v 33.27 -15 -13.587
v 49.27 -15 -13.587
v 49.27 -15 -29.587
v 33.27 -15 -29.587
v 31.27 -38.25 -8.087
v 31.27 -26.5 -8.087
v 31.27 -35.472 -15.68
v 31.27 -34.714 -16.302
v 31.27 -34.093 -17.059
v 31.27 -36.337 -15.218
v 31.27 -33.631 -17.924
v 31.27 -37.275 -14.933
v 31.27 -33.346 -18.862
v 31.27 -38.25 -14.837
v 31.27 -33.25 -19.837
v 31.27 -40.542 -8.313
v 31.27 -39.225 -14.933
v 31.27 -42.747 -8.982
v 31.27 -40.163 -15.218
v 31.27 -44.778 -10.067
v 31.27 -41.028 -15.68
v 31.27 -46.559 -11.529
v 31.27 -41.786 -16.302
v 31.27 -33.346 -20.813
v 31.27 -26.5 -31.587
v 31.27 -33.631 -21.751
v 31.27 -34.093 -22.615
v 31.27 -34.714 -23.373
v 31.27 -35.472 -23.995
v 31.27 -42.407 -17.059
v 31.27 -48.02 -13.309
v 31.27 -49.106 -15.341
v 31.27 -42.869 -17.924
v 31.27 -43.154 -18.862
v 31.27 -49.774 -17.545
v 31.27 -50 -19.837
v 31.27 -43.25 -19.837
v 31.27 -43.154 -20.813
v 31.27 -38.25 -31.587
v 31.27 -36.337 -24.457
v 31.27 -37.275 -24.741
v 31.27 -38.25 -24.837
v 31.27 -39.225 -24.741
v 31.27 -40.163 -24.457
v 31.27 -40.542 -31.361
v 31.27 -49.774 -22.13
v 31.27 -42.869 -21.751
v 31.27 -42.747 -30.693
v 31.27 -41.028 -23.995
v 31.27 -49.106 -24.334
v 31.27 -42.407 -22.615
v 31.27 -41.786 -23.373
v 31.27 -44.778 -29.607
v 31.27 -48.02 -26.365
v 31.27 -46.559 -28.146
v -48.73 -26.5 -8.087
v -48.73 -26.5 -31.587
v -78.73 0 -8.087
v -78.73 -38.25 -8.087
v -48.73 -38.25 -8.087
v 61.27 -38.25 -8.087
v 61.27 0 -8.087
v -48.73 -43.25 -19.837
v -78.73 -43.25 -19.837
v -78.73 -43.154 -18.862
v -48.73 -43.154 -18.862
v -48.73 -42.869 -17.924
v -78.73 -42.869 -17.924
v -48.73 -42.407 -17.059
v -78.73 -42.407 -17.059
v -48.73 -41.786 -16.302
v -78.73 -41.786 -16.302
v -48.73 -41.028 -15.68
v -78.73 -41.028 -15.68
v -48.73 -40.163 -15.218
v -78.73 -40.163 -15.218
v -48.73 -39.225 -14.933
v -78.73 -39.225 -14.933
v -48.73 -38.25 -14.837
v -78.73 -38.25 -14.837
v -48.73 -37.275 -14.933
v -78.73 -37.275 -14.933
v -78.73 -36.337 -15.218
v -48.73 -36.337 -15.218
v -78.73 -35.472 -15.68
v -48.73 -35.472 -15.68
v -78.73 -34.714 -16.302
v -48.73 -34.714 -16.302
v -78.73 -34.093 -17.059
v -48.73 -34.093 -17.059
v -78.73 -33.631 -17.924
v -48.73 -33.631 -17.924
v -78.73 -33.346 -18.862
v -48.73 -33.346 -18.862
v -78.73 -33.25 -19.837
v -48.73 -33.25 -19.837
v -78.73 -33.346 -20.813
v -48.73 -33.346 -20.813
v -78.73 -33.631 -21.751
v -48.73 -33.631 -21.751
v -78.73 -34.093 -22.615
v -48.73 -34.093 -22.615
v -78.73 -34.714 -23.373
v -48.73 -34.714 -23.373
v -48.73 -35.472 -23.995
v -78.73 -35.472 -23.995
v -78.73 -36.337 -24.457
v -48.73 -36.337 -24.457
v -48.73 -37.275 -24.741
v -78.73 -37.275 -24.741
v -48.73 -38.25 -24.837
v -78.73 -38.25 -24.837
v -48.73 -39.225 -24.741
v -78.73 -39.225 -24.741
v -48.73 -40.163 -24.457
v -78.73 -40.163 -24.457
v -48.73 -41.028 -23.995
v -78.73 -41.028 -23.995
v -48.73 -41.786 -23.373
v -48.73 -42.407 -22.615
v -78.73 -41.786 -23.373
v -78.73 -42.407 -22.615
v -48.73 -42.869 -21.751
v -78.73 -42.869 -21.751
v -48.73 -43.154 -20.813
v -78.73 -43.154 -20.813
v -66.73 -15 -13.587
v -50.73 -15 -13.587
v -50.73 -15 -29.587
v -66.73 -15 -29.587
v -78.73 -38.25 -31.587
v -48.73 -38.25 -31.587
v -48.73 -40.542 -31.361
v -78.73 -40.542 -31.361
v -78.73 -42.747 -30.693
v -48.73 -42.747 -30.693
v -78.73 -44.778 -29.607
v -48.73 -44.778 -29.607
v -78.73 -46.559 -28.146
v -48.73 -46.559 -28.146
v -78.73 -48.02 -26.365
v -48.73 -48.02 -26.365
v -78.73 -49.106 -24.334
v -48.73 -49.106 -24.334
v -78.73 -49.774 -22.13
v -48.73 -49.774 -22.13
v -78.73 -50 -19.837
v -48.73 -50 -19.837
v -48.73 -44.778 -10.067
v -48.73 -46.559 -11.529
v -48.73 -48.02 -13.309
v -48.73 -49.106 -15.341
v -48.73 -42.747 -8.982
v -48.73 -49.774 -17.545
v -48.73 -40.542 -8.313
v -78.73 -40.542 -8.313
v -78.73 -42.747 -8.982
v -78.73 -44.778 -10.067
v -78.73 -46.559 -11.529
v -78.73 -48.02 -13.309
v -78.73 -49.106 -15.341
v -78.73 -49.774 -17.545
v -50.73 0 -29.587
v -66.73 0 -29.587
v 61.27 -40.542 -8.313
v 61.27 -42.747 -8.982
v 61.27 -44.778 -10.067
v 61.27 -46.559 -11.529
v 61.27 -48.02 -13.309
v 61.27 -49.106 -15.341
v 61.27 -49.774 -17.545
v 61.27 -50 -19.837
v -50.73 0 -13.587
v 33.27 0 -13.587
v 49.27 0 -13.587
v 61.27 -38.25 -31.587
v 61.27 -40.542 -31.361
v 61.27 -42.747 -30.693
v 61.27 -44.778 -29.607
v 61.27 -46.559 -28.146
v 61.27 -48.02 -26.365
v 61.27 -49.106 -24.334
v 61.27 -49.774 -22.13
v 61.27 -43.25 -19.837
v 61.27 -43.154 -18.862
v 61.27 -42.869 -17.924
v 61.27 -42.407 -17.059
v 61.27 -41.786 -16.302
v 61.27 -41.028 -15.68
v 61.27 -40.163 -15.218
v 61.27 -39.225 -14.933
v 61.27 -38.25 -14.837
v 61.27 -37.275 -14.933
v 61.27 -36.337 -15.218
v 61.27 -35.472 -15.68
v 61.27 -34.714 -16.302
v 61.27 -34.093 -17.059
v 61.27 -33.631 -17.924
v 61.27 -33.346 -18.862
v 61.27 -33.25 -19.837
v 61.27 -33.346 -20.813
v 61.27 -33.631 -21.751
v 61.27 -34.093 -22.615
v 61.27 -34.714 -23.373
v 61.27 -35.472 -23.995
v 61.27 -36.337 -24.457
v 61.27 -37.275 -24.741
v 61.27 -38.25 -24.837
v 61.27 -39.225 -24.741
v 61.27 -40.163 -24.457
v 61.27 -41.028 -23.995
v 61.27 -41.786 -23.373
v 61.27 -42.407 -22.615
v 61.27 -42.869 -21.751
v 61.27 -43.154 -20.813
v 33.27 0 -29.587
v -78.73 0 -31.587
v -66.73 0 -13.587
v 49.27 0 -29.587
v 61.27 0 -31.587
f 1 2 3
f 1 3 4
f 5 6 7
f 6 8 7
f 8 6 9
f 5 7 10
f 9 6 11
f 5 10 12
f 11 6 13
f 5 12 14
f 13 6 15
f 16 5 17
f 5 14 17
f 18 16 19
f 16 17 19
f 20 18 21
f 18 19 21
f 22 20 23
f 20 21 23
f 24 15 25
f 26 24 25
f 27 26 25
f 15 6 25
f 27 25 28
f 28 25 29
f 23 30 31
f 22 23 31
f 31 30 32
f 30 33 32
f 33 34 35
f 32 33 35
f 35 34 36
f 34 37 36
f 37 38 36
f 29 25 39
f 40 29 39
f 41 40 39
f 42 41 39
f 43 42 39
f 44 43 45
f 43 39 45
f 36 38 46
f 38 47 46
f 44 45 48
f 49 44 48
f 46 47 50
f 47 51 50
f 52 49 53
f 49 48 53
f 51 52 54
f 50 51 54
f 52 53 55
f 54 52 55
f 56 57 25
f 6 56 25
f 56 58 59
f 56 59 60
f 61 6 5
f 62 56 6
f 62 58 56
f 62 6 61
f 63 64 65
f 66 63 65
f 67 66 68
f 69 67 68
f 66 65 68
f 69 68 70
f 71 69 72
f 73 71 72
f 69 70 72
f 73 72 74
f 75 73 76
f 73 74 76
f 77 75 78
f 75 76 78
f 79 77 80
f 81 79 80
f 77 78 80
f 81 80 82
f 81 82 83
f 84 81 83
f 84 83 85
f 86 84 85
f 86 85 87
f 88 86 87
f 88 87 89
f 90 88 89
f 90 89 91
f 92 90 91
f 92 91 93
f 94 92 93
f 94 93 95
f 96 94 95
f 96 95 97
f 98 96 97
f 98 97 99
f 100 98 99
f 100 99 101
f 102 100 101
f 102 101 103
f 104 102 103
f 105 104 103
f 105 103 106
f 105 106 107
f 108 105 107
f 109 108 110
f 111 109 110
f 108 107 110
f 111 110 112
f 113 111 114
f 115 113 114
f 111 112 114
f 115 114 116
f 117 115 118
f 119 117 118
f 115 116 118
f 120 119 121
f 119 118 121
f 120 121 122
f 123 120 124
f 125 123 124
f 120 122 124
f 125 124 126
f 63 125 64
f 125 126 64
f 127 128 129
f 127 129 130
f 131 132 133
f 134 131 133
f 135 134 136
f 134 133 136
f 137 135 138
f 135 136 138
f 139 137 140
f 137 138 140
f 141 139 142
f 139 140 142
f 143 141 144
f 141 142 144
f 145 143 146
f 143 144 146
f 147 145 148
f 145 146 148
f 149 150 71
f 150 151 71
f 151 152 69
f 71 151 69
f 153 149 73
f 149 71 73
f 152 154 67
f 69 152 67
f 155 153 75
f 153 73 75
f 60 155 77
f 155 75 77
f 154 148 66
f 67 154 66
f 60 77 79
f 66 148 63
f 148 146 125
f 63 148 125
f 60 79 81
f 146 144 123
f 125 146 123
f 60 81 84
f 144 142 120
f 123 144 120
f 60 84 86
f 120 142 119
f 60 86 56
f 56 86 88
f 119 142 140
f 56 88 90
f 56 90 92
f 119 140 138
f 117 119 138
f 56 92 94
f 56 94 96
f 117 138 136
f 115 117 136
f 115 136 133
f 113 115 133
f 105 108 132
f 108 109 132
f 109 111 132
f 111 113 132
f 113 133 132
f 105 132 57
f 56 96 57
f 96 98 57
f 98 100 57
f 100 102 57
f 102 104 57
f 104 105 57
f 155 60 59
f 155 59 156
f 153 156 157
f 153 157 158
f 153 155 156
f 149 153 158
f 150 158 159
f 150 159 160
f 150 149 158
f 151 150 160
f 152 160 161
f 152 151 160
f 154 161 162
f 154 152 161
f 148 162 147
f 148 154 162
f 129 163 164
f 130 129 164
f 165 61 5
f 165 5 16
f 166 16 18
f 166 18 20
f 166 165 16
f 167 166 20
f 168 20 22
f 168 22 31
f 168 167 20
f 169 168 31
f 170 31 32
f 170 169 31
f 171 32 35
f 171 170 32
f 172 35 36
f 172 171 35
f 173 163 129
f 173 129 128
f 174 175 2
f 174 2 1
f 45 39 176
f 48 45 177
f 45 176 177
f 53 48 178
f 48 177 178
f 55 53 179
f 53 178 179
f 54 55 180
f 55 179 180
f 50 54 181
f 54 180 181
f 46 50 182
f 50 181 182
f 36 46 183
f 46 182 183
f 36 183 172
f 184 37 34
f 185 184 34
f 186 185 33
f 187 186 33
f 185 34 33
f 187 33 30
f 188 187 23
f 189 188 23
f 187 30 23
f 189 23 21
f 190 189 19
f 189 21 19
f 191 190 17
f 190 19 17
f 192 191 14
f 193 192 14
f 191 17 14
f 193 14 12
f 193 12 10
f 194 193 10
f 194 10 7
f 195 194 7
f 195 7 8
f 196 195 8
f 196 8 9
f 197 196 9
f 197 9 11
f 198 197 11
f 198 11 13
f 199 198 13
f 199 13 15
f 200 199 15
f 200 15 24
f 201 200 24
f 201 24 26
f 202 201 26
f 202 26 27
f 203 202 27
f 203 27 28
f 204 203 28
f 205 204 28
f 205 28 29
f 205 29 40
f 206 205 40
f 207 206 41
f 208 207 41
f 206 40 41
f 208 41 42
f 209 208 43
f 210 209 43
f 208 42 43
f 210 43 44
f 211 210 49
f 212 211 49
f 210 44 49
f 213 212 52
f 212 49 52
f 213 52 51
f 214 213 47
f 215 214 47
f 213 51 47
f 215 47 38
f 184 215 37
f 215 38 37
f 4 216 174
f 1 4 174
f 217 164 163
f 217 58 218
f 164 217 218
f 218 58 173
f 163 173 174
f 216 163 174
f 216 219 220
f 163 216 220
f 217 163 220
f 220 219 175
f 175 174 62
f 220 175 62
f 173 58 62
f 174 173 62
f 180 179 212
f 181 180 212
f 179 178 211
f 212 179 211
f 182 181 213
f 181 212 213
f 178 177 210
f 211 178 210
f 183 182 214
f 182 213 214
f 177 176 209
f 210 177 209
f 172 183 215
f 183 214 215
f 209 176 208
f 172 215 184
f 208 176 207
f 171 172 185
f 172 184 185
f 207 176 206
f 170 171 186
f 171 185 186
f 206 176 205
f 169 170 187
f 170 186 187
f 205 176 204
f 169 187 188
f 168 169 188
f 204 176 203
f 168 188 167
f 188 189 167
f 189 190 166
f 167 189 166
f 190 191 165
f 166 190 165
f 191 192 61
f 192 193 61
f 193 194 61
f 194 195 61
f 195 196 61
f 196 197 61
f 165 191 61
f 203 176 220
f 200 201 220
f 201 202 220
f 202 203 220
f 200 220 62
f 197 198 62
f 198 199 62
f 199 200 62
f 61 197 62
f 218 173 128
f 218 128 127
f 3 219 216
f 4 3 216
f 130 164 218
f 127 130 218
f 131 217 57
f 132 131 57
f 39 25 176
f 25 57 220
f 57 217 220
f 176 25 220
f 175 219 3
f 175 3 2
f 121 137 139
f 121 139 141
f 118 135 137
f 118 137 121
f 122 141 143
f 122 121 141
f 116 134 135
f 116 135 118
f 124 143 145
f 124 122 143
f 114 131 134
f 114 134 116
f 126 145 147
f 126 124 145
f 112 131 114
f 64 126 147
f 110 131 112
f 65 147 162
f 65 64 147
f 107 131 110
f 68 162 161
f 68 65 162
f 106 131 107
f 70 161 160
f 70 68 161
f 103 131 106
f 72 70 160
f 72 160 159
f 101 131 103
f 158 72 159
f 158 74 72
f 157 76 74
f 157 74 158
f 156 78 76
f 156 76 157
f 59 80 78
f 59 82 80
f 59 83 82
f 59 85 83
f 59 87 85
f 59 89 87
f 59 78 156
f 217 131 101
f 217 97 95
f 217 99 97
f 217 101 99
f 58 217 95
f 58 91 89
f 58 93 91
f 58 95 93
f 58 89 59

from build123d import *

# Parameters (mm, degrees)
F0_W     = 140
F0_H     = 23.5
F1_DEPTH = 50
F2_W     = 16
F2_H     = 16
F3_DEPTH = 15
F4_R     = 11.74999
F5_R     = 5
F6_DEPTH = 140
F8_DEPTH = 25


# Not quite as in the source:
# - a fillet or chamfer is up to 0.001 mm smaller than in the source, because OpenCascade refuses the exact size


with BuildPart() as f1:
    # F0 (on Front) → F1 (new body)
    with BuildSketch(Plane.XZ):
        with Locations((-8.7296748534, -19.8372076215)):
            Rectangle(F0_W, F0_H)
    extrude(amount=F1_DEPTH)

    # F2 (on face) → F3 (cut)
    with BuildSketch(Plane(origin=(0, 0, 0), x_dir=(-1, 0, 0), z_dir=(0, 1, 0))):
        with Locations((-41.2703251466, -21.5872076215)):
            Rectangle(F2_W, F2_H)
        with Locations((58.7296748534, -21.5872076215)):
            Rectangle(F2_W, F2_H)
    extrude(amount=-F3_DEPTH, mode=Mode.SUBTRACT)

    # F4 (radius 11.75 in the source; OpenCascade refuses exactly that, so slightly less here)
    f4_edges = [f1.edges().sort_by_distance(p)[0] for p in [
        (-8.729675, -50, -8.087208),
        (-8.729675, -50, -31.587208),
    ]]
    fillet(f4_edges, radius=F4_R)

    # F5 (on face) → F6 (cut, through all)
    with BuildSketch(Plane(origin=(-78.7296748534, 0, 0), x_dir=(0, -1, 0), z_dir=(-1, 0, 0))):
        with Locations((38.25, -19.8372076215)):
            Circle(F5_R)
    extrude(amount=-F6_DEPTH, mode=Mode.SUBTRACT)

    # F7 (on face) → F8 (cut)
    with BuildSketch(Plane(origin=(0, 0, -31.5872076215), x_dir=(1, 0, 0), z_dir=(0, 0, -1))):
        Polygon((31.2703251466, 51.5), (-8.7296748534, 51.5), (-48.7296748534, 51.5), (-48.7296748534, 26.5), (-8.7296748534, 26.5), (31.2703251466, 26.5), align=None)
    extrude(amount=-F8_DEPTH, mode=Mode.SUBTRACT)


solid = f1.part
